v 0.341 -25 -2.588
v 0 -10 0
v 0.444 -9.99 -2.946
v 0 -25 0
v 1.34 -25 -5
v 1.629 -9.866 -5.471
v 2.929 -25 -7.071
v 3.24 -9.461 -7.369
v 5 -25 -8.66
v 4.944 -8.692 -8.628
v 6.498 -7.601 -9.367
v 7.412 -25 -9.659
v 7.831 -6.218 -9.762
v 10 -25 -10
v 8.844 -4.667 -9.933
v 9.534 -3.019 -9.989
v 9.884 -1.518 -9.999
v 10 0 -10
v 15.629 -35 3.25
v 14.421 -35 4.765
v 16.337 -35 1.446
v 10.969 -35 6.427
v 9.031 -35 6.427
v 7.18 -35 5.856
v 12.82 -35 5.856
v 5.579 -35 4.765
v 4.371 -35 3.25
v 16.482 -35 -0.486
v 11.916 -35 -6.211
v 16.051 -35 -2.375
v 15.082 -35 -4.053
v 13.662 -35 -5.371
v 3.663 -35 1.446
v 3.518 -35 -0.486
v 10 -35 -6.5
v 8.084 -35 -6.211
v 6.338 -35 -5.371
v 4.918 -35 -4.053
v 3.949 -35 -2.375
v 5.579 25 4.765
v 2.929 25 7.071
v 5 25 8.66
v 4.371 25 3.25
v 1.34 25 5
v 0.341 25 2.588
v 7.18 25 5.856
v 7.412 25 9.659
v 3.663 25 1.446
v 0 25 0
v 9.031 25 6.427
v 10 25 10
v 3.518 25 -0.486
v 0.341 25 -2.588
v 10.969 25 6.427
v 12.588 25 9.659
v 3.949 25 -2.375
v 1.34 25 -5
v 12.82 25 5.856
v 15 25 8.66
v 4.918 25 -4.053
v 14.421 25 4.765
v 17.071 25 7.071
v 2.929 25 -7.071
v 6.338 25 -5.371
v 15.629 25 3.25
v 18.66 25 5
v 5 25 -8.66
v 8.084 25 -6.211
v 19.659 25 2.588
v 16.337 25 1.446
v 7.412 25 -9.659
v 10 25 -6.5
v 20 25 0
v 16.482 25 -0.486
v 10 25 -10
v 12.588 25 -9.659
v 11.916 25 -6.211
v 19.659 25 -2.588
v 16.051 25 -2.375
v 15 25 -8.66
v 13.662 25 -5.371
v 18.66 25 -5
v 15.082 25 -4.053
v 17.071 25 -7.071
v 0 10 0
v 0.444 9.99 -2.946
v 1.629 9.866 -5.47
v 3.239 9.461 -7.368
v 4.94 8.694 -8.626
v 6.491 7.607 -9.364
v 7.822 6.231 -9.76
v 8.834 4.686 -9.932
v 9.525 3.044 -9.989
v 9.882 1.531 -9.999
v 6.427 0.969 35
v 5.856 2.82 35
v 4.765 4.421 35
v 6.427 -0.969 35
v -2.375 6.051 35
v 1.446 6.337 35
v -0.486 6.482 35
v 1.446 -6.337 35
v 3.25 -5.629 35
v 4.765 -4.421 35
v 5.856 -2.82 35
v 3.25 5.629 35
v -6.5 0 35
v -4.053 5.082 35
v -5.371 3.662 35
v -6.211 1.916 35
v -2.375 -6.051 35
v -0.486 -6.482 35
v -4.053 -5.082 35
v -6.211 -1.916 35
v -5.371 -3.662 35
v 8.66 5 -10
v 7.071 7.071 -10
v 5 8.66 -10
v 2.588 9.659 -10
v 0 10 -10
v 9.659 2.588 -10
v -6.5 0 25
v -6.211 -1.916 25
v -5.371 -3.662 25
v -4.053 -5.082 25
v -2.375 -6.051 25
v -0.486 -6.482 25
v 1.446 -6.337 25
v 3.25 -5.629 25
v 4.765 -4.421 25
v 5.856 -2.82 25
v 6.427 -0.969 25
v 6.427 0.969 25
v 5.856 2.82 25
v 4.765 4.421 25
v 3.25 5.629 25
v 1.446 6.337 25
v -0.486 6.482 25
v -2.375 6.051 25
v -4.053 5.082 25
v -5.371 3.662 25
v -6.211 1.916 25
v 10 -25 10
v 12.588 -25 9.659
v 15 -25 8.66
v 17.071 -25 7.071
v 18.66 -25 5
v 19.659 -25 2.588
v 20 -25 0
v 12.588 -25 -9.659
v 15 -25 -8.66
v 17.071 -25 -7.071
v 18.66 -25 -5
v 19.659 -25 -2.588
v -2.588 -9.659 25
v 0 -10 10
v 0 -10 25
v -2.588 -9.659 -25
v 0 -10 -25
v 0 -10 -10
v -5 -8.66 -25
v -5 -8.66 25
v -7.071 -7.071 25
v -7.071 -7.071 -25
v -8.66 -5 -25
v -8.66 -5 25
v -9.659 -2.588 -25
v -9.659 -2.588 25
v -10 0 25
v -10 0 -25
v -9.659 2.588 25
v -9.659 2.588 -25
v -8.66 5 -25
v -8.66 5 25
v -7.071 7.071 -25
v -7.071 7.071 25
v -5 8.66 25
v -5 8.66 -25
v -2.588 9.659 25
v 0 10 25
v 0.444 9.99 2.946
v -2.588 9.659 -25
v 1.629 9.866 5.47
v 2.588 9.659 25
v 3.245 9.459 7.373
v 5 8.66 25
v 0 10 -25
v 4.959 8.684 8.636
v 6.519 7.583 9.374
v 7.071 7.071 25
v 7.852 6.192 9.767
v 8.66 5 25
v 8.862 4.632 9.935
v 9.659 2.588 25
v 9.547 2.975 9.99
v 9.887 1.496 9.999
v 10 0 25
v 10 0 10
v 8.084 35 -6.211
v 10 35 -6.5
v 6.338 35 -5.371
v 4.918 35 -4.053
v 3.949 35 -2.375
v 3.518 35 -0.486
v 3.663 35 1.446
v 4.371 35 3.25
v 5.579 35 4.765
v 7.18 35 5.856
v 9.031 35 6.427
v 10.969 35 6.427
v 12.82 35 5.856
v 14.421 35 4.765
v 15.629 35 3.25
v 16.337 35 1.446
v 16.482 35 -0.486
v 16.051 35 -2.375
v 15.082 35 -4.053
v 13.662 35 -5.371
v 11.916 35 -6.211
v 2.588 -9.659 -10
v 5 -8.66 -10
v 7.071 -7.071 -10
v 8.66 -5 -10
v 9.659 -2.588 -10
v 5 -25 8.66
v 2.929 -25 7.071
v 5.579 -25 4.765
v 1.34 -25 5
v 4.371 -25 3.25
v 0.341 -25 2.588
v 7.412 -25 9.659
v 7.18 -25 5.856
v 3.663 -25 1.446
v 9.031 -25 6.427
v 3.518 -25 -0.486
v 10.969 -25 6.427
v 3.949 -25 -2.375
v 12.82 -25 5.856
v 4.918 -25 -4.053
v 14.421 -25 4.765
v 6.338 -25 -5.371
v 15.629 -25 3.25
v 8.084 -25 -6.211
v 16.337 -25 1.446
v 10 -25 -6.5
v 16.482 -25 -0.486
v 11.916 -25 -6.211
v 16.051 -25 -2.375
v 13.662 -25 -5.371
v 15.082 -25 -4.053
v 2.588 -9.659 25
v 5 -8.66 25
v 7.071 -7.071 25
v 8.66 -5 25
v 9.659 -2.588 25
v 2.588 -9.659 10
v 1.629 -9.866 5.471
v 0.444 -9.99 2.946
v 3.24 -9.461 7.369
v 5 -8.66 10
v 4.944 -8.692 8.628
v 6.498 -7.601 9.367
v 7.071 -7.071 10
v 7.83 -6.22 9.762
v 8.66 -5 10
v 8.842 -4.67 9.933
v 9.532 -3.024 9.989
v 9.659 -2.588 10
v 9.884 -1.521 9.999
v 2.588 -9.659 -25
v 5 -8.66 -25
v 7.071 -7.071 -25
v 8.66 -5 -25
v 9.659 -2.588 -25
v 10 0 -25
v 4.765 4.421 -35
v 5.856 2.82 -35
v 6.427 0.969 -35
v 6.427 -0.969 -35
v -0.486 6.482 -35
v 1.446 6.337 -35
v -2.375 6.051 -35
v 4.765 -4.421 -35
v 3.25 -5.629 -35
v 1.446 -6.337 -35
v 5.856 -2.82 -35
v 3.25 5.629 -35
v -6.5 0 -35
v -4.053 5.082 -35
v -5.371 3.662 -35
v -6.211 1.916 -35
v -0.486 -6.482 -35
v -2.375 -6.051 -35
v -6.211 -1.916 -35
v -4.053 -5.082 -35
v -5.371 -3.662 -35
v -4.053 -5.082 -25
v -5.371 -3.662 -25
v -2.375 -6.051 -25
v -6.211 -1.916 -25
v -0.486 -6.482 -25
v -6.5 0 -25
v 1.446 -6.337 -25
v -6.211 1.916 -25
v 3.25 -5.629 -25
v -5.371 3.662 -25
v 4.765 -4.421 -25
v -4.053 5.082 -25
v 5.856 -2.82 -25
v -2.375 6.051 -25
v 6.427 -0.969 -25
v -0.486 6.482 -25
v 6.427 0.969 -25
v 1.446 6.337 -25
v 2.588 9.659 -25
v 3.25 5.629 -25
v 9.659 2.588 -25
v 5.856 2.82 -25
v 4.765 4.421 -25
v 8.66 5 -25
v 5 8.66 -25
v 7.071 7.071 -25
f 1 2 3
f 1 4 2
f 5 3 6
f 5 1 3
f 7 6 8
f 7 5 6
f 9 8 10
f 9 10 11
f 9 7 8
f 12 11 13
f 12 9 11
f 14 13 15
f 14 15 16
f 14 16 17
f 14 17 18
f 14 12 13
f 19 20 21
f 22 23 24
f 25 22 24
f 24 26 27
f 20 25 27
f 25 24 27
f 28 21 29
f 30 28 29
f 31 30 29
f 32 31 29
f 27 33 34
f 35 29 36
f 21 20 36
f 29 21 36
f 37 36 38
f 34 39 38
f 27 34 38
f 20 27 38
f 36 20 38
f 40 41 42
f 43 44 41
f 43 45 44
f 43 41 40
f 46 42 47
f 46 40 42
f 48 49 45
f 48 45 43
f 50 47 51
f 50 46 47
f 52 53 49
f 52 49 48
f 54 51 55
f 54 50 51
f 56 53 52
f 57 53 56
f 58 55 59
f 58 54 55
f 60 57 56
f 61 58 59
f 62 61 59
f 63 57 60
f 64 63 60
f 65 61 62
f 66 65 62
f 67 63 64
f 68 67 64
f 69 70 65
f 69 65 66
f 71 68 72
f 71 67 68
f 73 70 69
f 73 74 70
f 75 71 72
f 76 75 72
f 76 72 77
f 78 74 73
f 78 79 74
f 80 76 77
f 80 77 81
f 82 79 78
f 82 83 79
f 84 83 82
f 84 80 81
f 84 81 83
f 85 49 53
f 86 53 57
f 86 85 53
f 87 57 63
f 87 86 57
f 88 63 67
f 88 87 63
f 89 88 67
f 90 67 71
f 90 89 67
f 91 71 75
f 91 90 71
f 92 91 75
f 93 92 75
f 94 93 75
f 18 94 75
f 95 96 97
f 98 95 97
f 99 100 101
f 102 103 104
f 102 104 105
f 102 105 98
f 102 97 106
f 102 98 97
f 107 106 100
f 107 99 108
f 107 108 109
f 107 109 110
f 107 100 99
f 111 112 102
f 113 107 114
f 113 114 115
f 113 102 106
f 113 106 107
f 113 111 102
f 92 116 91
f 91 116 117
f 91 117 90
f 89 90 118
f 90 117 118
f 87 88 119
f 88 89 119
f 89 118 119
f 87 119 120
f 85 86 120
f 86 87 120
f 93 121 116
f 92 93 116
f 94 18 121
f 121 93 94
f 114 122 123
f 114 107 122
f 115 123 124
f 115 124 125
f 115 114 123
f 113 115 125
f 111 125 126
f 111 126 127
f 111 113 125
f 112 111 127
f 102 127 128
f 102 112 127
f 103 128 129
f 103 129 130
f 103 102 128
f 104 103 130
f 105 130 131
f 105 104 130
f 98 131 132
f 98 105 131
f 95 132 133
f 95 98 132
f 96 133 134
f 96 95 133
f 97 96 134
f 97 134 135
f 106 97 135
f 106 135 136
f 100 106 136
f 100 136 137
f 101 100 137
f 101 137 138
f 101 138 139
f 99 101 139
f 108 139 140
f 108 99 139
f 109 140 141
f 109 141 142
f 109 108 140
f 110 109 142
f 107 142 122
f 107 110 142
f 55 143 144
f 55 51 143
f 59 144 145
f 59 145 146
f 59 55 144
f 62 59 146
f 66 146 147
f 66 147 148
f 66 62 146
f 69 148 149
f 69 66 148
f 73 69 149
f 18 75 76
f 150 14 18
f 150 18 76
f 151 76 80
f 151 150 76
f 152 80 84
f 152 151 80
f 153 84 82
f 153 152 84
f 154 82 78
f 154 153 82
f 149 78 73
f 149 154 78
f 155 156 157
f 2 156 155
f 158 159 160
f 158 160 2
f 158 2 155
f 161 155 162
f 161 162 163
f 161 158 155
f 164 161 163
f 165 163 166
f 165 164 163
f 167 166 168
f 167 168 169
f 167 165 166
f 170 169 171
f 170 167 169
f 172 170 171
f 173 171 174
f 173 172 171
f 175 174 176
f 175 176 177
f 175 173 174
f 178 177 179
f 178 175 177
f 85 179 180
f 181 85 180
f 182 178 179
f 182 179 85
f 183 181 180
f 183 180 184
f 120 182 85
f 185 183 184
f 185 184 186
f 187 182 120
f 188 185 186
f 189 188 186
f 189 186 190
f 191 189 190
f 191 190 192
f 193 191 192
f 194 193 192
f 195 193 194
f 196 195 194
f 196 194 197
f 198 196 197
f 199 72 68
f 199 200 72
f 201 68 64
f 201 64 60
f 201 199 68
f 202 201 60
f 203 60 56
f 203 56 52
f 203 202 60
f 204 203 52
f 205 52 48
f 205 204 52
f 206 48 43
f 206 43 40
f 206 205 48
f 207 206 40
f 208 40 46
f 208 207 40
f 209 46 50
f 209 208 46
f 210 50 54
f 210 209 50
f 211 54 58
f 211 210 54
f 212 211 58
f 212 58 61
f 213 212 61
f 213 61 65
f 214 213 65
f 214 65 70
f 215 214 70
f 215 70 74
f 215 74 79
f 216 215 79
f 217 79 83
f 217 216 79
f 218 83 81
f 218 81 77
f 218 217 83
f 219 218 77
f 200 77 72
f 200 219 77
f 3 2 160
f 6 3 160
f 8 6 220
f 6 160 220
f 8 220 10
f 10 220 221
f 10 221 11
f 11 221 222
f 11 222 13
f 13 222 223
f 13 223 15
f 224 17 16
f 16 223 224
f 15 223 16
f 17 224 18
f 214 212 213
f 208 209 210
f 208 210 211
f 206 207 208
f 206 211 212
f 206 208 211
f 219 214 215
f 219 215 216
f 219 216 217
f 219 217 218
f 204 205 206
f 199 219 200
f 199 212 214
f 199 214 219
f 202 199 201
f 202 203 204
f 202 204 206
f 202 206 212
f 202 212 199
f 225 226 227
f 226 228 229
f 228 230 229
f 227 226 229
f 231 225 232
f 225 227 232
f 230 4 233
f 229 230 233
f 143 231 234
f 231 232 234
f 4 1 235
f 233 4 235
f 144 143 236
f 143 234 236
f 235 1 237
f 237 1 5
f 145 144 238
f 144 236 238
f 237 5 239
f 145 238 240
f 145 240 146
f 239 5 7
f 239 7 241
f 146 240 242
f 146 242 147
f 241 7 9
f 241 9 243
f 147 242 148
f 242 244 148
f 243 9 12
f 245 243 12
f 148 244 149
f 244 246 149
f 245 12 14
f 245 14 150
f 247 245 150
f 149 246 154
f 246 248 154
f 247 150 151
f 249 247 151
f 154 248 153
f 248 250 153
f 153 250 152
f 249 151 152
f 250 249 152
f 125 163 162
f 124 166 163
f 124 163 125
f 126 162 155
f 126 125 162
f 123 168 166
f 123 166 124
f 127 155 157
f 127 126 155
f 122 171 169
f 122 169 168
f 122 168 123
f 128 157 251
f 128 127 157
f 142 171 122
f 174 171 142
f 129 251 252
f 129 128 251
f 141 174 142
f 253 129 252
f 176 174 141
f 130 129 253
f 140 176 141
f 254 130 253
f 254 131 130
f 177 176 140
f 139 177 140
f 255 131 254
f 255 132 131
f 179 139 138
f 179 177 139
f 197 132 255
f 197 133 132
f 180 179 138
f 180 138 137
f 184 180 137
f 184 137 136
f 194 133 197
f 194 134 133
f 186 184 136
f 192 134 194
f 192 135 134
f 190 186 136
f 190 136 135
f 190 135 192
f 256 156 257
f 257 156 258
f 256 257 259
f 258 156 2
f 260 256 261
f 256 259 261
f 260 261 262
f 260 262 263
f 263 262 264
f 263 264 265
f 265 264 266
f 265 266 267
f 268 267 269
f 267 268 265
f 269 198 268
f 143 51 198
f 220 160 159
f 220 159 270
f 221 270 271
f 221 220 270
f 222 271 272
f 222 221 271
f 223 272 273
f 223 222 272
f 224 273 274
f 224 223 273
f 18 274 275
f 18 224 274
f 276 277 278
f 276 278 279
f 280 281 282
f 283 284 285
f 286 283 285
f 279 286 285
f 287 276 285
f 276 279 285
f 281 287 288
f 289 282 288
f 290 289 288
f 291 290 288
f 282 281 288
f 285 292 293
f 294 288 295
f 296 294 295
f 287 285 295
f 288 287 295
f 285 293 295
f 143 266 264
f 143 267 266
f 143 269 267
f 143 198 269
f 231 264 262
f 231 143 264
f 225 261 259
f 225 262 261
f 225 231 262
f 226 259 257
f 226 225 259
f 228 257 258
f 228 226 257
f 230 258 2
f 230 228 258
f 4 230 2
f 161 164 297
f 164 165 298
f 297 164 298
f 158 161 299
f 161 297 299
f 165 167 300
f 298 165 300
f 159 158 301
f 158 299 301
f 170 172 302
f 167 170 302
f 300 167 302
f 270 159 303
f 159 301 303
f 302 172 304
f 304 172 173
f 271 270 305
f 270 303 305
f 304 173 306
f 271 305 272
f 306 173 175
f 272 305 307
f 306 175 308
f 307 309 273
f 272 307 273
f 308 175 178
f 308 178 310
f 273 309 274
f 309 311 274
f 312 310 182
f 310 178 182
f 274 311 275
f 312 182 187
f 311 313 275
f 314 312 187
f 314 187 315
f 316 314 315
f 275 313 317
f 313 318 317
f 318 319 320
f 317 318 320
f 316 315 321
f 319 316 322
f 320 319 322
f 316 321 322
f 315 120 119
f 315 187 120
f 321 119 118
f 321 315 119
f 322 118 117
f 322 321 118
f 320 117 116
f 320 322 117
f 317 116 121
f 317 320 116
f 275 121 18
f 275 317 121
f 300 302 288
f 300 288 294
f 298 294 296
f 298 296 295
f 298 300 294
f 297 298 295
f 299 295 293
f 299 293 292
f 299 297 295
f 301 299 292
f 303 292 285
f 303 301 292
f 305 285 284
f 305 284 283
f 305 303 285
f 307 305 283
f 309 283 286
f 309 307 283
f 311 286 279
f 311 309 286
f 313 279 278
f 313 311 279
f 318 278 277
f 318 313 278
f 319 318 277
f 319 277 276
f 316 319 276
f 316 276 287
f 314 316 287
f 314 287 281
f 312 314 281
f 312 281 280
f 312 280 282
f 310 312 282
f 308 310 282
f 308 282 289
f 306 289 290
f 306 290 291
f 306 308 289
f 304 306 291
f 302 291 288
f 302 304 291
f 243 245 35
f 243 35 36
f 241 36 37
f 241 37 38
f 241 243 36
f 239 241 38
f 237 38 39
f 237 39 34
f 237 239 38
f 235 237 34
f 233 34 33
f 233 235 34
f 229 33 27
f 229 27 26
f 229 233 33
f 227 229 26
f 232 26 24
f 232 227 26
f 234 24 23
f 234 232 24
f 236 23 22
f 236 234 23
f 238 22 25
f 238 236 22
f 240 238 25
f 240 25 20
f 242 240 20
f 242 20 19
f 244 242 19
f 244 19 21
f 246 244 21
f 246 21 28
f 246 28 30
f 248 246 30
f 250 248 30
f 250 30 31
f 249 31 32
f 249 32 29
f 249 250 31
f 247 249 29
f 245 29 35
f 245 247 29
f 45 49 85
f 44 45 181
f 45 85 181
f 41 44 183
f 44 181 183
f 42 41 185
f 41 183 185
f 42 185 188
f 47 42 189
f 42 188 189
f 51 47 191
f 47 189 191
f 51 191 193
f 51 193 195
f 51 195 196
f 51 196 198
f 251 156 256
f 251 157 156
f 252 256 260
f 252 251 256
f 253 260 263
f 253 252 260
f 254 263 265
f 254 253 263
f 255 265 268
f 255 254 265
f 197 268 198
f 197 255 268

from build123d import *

# Parameters (mm, degrees)
SKETCH2_W           = 20
SKETCH2_H           = 20
BOSS_EXTRUDE1_DEPTH = 25
SKETCH4_W           = 20
SKETCH4_H           = 20
BOSS_EXTRUDE2_DEPTH = 25
SKETCH5_R           = 6.5
BOSS_EXTRUDE3_DEPTH = 35
SKETCH7_R           = 6.5
BOSS_EXTRUDE4_DEPTH = 35
FILLET1_START       = -25
FILLET1_DEPTH       = 50
FILLET1_START_2     = 10
FILLET1_2_DEPTH     = 15
FILLET1_3_DEPTH     = 50
FILLET2_R           = 10
FILLET3_START       = -1e-07
FILLET3_DEPTH       = 25.0000001
FILLET3_START_2     = -25
FILLET3_2_DEPTH     = 34.870059035
FILLET3_START_3     = -10
FILLET3_3_DEPTH     = 20
FILLET4_R           = 10
FILLET5_START       = -25
FILLET5_DEPTH       = 50
FILLET5_2_DEPTH     = 24.9999999
FILLET5_START_2     = -10
FILLET5_3_DEPTH     = 20


with BuildPart() as part:
    # Sketch2 → Boss-Extrude1 (new, symmetric)
    with BuildSketch(Plane.XY):
        Rectangle(SKETCH2_W, SKETCH2_H)
    extrude(amount=BOSS_EXTRUDE1_DEPTH, both=True)

    # Sketch4 → Boss-Extrude2 (add, symmetric)
    with BuildSketch(Plane(origin=(0, 0, 0), x_dir=(1, 0, 0), z_dir=(0, 1, 0))):
        with Locations((10, 0)):
            Rectangle(SKETCH4_W, SKETCH4_H)
    extrude(amount=BOSS_EXTRUDE2_DEPTH, both=True)

    # Sketch5 → Boss-Extrude3 (add, symmetric)
    with BuildSketch(Plane(origin=(0, 0, 0), x_dir=(1, 0, 0), z_dir=(0, 1, 0))):
        with Locations(Location((10, 0, 0), (0, 0, 90))):
            Circle(SKETCH5_R)
    extrude(amount=BOSS_EXTRUDE3_DEPTH, both=True)

    # Sketch7 → Boss-Extrude4 (add, symmetric)
    with BuildSketch(Plane.XY):
        with Locations(Location((0, 0, 0), (0, 0, 180))):
            Circle(SKETCH7_R)
    extrude(amount=BOSS_EXTRUDE4_DEPTH, both=True)

    # Fillet1: read off the stored shape, not the designer's step
    # Fillet1 outline → Fillet1 (cut)
    with BuildSketch(Plane(origin=(0, 0, 0), x_dir=(1, 0, 0), z_dir=(0, 1, 0)).offset(FILLET1_START)):
        with BuildLine():
            Line((20, 10), (10, 10))
            ThreePointArc((10, 10), (17.071067812, 7.071067812), (20, 0))
            Line((20, 0), (20, 10))
        make_face()
    extrude(amount=FILLET1_DEPTH, mode=Mode.SUBTRACT)

    # Fillet1 2 outline → Fillet1 2 (cut)
    with BuildSketch(Plane(origin=(0, 0, 0), x_dir=(1, 0, 0), z_dir=(0, 1, 0)).offset(FILLET1_START_2)):
        with BuildLine():
            ThreePointArc((10, -10), (2.928932188, -7.071067812), (0, 0))
            Line((0, 0), (0, -10))
            Line((0, -10), (10, -10))
        make_face()
    extrude(amount=FILLET1_2_DEPTH, mode=Mode.SUBTRACT)

    # Fillet1 3 outline → Fillet1 3 (cut)
    with BuildSketch(Plane.XY.offset(FILLET1_START)):
        with BuildLine():
            Line((-10, 10), (-10, 0))
            ThreePointArc((-10, 0), (-7.071067812, 7.071067812), (0, 10))
            Line((0, 10), (-10, 10))
        make_face()
    extrude(amount=FILLET1_3_DEPTH, mode=Mode.SUBTRACT)

    # Fillet2
    fillet2_edges = [part.edges().sort_by_distance(p)[0] for p in [
        (20, 0, 10),
        (10, 10, -17.5),
        (10, -10, 17.5),
    ]]
    fillet(fillet2_edges, radius=FILLET2_R - 0.0001)  # a hair under: the kernel refuses the full size

    # Fillet3: read off the stored shape, not the designer's step
    # Fillet3 outline → Fillet3 (cut)
    with BuildSketch(Plane.XY.offset(FILLET3_START)):
        with BuildLine():
            Line((10, 10), (0, 10))
            ThreePointArc((0, 10), (7.071067812, 7.071067812), (10, 0))
            Line((10, 0), (10, 10))
        make_face()
        with BuildLine():
            Line((-10, -10), (0, -10))
            ThreePointArc((0, -10), (-7.071067812, -7.071067812), (-10, 0))
            Line((-10, 0), (-10, -10))
        make_face()
    extrude(amount=FILLET3_DEPTH, mode=Mode.SUBTRACT)

    # Fillet3 2 outline → Fillet3 2 (cut)
    with BuildSketch(Plane.XY.offset(FILLET3_START_2)):
        with BuildLine():
            Line((-10, -10), (0, -10))
            ThreePointArc((0, -10), (-7.071067812, -7.071067812), (-10, 0))
            Line((-10, 0), (-10, -10))
        make_face()
    extrude(amount=FILLET3_2_DEPTH, mode=Mode.SUBTRACT)

    # Fillet3 3 outline → Fillet3 3 (add)
    with BuildSketch(Plane(origin=(0, 0, 0), x_dir=(1, 0, 0), z_dir=(0, 1, 0)).offset(FILLET3_START_3)):
        with BuildLine():
            ThreePointArc((0, 0), (2.928932188, -7.071067812), (10, -10))
            Line((10, -10), (10, 1e-07))
            Line((10, 1e-07), (0, 0))
        make_face()
    extrude(amount=FILLET3_3_DEPTH)

    # Fillet4
    fillet4_edges = [part.edges().sort_by_distance(p)[0] for p in [
        (10, -10, -17.5),
    ]]
    fillet(fillet4_edges, radius=FILLET4_R - 0.0001)  # a hair under: the kernel refuses the full size

    # Fillet5: read off the stored shape, not the designer's step
    # Fillet5 outline → Fillet5 (cut)
    with BuildSketch(Plane(origin=(0, 0, 0), x_dir=(1, 0, 0), z_dir=(0, 1, 0)).offset(FILLET5_START)):
        with BuildLine():
            Line((0, 10), (0, 0))
            ThreePointArc((0, 0), (2.928932188, 7.071067812), (10, 10))
            Line((10, 10), (0, 10))
        make_face()
    extrude(amount=FILLET5_DEPTH, mode=Mode.SUBTRACT)

    # Fillet5 2 outline → Fillet5 2 (cut)
    with BuildSketch(Plane(origin=(0, 0, 0), x_dir=(1, 0, 0), z_dir=(0, 1, 0)).offset(FILLET5_START)):
        with BuildLine():
            ThreePointArc((10, -10), (2.928932188, -7.071067812), (0, 0))
            Line((0, 0), (0, -10))
            Line((0, -10), (10, -10))
        make_face()
    extrude(amount=FILLET5_2_DEPTH, mode=Mode.SUBTRACT)

    # Fillet5 3 outline → Fillet5 3 (add)
    with BuildSketch(Plane.XY.offset(FILLET5_START_2)):
        with BuildLine():
            ThreePointArc((10, 0), (7.071067812, 7.071067812), (0, 10))
            Line((0, 10), (0, -10))
            ThreePointArc((0, -10), (7.071067812, -7.071067812), (10, 0))
        make_face()
    extrude(amount=FILLET5_3_DEPTH)


solid = part.part
